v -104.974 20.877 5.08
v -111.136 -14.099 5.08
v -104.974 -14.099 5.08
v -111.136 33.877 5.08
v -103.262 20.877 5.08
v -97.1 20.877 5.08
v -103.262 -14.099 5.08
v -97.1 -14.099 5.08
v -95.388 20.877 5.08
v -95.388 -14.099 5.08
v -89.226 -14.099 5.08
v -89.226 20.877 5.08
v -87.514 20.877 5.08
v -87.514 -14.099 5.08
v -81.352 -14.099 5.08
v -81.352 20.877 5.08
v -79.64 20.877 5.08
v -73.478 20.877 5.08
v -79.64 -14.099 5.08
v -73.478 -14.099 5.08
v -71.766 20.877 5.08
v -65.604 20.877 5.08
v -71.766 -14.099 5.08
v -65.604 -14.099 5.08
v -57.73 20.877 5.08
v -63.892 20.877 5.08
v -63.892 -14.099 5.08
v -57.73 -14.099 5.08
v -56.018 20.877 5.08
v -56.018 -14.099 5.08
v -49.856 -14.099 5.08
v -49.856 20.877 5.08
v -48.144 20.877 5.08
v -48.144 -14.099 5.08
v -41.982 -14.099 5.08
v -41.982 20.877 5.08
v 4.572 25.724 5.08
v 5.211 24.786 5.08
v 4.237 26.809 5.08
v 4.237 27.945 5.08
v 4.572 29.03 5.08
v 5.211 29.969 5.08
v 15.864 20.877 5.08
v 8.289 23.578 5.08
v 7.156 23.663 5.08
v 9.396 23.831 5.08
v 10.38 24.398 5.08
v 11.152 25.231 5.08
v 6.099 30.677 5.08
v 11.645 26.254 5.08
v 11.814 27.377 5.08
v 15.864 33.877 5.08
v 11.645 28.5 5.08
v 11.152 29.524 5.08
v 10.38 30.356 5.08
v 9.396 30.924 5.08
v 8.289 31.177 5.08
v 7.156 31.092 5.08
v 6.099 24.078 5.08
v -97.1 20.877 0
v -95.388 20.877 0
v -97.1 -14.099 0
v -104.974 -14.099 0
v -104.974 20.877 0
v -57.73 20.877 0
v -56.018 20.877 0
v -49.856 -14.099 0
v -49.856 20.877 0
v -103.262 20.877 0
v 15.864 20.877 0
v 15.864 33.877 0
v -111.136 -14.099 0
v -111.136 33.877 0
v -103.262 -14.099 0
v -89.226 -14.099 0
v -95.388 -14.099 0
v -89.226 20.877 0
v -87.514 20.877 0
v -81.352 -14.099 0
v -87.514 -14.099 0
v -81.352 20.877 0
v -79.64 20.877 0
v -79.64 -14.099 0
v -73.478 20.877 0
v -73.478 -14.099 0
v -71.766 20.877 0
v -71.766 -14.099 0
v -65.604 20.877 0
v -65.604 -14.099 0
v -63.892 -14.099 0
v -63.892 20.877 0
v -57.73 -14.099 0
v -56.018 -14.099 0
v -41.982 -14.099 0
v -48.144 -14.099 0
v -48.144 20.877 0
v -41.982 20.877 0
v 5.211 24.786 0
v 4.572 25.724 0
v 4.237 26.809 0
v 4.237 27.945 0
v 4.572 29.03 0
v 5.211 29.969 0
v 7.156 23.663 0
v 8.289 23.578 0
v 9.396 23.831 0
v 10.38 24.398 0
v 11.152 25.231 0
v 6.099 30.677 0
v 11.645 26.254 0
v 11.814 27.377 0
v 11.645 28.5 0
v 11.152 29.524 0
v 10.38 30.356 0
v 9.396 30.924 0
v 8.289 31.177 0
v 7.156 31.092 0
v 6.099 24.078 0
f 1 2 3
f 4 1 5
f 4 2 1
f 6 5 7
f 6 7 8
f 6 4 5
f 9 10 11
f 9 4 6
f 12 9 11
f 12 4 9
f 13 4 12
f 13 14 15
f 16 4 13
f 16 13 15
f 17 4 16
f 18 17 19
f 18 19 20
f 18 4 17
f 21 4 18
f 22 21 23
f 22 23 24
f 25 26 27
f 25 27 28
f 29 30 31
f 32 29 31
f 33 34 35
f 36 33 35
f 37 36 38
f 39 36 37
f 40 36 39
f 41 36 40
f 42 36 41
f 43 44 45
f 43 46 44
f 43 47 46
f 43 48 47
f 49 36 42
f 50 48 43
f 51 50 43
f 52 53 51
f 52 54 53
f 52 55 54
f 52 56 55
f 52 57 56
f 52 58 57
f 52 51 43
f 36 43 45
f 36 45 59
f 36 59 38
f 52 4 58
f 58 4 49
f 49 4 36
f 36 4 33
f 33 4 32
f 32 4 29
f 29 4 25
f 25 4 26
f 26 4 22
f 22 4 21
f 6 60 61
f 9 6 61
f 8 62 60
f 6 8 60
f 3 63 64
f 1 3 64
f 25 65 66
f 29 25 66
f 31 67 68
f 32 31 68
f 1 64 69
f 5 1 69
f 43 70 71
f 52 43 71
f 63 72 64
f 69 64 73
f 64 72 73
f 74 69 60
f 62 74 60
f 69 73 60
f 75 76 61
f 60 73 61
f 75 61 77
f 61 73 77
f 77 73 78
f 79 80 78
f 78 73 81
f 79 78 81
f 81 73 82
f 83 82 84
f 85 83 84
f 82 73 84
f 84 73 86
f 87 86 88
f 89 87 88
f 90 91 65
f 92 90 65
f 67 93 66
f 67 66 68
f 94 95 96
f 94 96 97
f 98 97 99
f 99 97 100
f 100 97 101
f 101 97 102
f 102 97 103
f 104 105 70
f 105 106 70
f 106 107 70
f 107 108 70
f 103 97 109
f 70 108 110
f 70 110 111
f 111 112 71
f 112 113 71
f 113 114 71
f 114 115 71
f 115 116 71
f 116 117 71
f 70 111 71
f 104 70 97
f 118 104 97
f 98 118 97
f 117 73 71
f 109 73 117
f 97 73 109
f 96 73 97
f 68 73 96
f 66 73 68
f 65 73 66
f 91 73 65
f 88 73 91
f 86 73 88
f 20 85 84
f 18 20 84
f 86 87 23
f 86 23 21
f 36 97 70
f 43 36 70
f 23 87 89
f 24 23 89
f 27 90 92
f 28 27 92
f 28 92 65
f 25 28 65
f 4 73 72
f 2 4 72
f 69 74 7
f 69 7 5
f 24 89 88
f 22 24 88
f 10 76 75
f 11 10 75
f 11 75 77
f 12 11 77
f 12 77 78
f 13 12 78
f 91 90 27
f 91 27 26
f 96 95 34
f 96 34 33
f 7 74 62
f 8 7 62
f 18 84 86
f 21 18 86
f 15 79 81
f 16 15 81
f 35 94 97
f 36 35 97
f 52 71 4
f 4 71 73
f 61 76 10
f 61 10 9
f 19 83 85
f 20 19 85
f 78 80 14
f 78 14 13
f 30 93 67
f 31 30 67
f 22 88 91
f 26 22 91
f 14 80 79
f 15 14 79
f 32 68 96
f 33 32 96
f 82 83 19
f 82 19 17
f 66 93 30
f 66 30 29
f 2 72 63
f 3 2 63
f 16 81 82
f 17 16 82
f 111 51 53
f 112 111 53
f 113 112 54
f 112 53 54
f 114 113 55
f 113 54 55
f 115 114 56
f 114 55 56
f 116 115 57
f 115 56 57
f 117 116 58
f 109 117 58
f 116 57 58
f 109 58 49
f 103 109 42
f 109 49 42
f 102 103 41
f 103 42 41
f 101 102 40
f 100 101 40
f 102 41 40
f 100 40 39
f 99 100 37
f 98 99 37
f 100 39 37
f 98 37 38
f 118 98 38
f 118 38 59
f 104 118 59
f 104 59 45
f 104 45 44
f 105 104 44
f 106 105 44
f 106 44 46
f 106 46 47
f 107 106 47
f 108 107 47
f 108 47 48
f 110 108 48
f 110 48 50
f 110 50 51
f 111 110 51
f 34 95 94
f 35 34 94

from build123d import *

# Parameters (mm, degrees)
F0_W     = 6.16181
F0_H     = 34.9758
F1_DEPTH = 5.08
F2_R     = 3.81
F3_DEPTH = 25.4


with BuildPart() as f1:
    # F0 (on Top) → F1 (new body)
    with BuildSketch(Plane.XY):
        Polygon((-111.135946, 33.877251), (-111.135946, 20.877251), (-104.974136, 20.877251), (-103.261946, 20.877251), (-97.100136, 20.877251), (-95.387946, 20.877251), (-89.226136, 20.877251), (-87.513946, 20.877251), (-81.352136, 20.877251), (-79.639946, 20.877251), (-73.478136, 20.877251), (-71.765946, 20.877251), (-65.604136, 20.877251), (-63.891946, 20.877251), (-57.730136, 20.877251), (-56.017946, 20.877251), (-49.856136, 20.877251), (-48.143946, 20.877251), (-41.982136, 20.877251), (15.864054, 20.877251), (15.864054, 33.877251), align=None)
        with Locations((-108.055041, 3.389351)):
            Rectangle(F0_W, F0_H)
        with Locations((-100.181041, 3.389351)):
            Rectangle(F0_W, F0_H)
        with Locations((-92.307041, 3.389351)):
            Rectangle(F0_W, F0_H)
        with Locations((-45.063041, 3.389351)):
            Rectangle(F0_W, F0_H)
        with Locations((-84.433041, 3.389351)):
            Rectangle(F0_W, F0_H)
        with Locations((-52.937041, 3.389351)):
            Rectangle(F0_W, F0_H)
        with Locations((-76.559041, 3.389351)):
            Rectangle(F0_W, F0_H)
        with Locations((-60.811041, 3.389351)):
            Rectangle(F0_W, F0_H)
        with Locations((-68.685041, 3.389351)):
            Rectangle(F0_W, F0_H)
    extrude(amount=F1_DEPTH)

    # F2 (on face) → F3 (cut)
    with BuildSketch(Plane.XY.offset(5.08)):
        with Locations((8.004281, 27.377251)):
            Circle(F2_R)
    extrude(amount=-F3_DEPTH, mode=Mode.SUBTRACT)


solid = f1.part
